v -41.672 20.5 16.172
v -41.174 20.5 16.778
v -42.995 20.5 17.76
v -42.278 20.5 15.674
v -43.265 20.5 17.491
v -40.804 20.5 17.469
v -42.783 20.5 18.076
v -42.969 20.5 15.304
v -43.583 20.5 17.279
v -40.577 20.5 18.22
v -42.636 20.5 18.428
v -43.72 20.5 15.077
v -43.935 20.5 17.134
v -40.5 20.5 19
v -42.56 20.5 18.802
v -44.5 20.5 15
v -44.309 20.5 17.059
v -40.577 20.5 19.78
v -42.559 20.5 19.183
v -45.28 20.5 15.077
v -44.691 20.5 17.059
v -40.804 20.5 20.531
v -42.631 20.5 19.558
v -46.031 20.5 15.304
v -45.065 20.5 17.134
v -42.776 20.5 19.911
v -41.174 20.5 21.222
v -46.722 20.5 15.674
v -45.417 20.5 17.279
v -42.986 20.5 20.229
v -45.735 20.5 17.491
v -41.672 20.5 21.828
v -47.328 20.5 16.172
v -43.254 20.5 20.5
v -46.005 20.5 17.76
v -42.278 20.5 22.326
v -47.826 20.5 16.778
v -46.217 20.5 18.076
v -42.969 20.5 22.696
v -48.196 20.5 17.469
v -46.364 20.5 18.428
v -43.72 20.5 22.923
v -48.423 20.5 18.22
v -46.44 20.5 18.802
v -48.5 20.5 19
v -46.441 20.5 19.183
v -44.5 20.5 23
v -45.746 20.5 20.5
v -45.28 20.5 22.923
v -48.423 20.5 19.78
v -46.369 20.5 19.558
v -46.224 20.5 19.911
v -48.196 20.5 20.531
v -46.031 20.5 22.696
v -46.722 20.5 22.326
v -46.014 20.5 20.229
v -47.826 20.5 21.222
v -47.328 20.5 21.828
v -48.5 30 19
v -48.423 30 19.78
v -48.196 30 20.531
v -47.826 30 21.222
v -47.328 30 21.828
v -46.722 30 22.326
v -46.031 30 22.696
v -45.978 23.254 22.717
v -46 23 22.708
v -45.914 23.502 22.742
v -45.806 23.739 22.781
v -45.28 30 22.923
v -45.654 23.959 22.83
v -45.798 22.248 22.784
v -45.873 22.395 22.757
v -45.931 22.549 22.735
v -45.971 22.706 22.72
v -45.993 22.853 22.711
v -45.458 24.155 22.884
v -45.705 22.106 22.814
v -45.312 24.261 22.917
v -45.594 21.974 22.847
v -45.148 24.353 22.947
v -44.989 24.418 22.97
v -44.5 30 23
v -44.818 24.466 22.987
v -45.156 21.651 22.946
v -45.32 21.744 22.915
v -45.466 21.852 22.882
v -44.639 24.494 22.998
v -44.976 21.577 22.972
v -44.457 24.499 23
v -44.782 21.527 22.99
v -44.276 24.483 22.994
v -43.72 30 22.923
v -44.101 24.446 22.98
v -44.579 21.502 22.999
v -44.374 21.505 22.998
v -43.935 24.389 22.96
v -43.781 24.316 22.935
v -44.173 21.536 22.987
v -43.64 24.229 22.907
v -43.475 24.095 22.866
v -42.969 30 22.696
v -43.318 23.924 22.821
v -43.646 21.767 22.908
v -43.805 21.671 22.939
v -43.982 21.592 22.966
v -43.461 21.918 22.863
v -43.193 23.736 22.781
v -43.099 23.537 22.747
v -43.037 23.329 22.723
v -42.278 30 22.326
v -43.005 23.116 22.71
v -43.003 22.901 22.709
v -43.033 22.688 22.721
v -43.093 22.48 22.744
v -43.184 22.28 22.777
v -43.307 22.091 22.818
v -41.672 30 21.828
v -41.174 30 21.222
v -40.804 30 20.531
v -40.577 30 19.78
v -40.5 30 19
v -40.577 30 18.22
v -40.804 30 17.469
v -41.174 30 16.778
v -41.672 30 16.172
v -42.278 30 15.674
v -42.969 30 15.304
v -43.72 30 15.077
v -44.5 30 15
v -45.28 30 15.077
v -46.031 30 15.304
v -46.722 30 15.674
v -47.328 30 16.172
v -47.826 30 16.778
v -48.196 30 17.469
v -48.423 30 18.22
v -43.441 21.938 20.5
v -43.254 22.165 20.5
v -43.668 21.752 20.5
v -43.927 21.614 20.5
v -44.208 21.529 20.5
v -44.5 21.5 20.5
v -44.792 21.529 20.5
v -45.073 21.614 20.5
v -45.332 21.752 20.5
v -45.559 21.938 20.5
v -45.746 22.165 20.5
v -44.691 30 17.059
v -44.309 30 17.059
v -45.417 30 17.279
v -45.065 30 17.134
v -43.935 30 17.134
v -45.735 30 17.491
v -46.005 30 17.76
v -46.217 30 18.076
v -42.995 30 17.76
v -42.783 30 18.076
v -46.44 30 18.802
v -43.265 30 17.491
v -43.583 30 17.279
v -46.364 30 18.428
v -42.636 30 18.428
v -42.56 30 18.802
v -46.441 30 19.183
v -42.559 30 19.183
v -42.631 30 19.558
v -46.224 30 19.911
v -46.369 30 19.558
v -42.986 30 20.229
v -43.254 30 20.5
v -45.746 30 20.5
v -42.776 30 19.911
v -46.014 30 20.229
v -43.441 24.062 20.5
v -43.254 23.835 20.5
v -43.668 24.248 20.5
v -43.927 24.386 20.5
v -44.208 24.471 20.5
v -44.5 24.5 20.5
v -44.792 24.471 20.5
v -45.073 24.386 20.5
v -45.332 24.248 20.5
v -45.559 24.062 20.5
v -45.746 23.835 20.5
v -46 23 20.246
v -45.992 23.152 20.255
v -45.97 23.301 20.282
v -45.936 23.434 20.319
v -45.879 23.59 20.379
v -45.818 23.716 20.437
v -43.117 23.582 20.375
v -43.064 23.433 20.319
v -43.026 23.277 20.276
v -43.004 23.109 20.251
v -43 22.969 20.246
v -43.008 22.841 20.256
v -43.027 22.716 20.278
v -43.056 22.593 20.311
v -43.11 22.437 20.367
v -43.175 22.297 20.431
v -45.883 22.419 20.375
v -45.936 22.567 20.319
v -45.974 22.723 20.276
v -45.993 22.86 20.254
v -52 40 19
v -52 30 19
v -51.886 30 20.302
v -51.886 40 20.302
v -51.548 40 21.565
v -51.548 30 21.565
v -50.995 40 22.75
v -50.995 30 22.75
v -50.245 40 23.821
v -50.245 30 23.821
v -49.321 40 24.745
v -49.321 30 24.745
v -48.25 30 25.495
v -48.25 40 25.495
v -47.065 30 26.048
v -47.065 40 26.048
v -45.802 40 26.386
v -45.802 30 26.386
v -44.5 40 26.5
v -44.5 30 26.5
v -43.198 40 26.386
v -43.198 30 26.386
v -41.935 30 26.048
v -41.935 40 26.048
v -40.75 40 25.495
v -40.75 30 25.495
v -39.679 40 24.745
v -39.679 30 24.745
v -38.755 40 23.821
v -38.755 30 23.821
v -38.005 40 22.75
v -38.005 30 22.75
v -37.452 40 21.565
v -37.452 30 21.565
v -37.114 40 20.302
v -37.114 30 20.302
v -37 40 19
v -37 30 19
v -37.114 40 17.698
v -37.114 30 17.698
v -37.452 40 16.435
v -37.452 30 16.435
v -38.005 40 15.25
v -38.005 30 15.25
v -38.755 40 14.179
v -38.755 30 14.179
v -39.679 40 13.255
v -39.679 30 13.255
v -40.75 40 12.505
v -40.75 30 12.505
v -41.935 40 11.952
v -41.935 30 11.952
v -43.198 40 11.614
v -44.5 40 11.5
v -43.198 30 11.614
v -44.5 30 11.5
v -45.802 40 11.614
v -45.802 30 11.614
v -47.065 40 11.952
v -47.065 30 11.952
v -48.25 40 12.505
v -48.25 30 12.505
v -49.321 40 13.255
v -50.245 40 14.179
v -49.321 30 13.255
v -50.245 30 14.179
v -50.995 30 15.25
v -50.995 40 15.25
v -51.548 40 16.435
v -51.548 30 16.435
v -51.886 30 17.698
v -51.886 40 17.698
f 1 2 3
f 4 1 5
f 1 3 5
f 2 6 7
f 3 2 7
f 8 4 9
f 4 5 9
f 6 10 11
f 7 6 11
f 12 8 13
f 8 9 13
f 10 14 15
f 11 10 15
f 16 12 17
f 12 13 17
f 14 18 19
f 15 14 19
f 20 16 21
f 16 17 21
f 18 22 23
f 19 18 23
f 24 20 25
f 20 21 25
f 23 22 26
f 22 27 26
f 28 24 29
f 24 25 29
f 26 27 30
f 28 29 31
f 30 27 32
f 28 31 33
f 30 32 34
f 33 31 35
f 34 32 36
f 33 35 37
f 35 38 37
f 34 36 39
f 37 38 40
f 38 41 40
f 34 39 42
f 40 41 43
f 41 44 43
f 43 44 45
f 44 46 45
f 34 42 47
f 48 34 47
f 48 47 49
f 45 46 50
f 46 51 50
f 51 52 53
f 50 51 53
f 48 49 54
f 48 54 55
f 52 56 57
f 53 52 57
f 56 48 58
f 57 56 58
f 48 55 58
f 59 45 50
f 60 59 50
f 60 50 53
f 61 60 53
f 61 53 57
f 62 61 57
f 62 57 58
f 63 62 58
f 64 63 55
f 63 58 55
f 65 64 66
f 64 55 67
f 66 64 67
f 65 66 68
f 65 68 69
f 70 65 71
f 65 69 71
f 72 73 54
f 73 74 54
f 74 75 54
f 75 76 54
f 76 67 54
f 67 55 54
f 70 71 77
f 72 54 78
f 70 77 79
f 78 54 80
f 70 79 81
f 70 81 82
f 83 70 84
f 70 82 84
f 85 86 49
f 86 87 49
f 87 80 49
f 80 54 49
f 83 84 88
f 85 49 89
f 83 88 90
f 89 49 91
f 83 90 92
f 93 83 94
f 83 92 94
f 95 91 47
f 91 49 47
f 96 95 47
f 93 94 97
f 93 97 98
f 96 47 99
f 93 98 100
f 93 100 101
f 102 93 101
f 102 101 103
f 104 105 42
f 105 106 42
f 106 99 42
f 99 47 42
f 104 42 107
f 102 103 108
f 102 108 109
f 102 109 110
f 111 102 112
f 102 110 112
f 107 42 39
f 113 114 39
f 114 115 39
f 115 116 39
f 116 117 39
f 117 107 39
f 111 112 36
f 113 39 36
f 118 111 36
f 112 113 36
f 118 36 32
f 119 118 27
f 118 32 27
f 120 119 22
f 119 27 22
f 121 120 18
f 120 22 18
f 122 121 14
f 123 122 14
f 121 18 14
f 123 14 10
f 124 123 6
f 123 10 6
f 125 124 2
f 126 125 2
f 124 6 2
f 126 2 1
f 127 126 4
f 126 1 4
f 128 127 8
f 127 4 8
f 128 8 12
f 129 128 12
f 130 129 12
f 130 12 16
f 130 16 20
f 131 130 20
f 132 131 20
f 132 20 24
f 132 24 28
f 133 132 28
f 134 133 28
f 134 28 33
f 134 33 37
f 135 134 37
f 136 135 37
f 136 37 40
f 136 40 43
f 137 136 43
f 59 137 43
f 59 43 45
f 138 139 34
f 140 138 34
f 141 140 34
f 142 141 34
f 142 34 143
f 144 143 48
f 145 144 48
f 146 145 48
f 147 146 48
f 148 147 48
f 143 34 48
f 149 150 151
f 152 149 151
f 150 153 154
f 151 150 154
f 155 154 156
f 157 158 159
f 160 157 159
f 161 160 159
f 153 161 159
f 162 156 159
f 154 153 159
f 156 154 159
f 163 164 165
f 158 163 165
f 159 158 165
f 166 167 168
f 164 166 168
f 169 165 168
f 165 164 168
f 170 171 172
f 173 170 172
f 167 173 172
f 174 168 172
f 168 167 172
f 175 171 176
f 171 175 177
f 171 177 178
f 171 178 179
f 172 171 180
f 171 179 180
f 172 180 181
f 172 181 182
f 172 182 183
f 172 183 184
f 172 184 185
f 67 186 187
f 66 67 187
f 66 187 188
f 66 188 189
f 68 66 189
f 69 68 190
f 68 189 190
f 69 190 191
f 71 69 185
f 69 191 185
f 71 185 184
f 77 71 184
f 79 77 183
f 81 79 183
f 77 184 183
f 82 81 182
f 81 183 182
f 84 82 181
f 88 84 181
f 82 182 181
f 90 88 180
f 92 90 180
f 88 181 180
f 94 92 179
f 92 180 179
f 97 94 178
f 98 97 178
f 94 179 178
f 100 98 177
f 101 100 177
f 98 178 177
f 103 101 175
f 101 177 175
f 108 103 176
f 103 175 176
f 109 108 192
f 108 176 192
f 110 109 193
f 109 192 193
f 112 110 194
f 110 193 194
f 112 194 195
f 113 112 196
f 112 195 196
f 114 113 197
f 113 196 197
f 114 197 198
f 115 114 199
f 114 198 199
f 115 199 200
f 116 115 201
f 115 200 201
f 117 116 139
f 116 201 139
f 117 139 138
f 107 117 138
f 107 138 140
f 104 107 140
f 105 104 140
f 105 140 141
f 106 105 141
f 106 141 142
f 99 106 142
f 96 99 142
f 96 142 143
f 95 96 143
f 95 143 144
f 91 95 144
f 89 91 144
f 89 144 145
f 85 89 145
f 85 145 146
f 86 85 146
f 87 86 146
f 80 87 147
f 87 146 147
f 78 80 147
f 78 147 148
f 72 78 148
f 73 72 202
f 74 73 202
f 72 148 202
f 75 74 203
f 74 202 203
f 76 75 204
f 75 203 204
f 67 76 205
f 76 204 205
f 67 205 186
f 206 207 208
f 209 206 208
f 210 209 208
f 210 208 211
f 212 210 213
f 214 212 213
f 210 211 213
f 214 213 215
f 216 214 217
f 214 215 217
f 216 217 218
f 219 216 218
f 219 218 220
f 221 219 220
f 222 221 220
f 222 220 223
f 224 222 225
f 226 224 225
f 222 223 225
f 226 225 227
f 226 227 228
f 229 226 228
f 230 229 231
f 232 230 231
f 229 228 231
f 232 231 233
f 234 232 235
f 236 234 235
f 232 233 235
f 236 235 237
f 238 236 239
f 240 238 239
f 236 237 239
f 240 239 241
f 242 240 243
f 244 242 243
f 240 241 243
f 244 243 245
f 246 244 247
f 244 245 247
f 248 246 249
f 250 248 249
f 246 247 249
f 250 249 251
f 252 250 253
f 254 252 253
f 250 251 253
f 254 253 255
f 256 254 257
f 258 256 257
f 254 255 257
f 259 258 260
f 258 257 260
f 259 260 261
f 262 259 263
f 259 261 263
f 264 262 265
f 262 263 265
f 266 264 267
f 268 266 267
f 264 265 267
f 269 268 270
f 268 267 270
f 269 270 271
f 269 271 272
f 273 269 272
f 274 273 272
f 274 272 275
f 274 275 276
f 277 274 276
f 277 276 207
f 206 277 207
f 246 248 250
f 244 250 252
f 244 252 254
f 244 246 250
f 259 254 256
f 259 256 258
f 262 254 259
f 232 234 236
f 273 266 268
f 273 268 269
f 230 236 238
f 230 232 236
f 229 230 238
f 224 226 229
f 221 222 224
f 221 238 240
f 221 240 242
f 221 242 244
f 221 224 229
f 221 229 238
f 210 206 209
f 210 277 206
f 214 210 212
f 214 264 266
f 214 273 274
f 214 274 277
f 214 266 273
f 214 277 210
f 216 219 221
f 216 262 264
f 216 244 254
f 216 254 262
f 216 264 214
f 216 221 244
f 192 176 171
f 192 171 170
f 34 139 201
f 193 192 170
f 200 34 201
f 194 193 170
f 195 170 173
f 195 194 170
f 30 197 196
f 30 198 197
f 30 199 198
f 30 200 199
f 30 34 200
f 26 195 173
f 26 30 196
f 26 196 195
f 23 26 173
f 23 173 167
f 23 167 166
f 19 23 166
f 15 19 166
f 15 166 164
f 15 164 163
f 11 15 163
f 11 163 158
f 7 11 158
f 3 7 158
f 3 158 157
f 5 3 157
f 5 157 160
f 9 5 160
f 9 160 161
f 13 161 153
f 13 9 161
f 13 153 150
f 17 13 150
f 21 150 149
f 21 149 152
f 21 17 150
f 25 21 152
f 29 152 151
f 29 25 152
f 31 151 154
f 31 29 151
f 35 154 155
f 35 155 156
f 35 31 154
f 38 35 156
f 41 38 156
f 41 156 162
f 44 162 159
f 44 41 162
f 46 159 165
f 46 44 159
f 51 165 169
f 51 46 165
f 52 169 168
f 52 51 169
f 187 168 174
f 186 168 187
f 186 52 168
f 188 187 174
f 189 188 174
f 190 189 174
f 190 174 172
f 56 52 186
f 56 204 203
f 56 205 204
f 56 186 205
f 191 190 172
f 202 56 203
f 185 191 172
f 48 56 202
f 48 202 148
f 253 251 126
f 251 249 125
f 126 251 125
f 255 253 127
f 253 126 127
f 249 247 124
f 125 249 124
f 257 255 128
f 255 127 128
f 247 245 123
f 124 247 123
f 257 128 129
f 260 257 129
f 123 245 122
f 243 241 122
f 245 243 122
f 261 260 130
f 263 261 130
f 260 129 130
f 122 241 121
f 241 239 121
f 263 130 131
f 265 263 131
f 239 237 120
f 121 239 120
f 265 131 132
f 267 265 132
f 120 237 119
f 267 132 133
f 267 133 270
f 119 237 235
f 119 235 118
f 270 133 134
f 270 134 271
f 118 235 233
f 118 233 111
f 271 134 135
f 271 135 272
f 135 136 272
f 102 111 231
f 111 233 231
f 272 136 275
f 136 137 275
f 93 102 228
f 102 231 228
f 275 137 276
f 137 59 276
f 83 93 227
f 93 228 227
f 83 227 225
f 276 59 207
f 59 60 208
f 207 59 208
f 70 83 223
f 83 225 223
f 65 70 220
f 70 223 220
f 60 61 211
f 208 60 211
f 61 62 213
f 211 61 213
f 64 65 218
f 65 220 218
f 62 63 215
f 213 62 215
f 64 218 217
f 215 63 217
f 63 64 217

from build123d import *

# Parameters (mm, degrees)
SKETCH268_R             = 4
PAD107_DEPTH            = 9.5
SKETCH269_R             = 7.5
PAD108_DEPTH            = 10
SKETCH270_R             = 1.5
POCKET131_DEPTH         = 7.501
BODY096_ROLL_ANGLE      = 90
BODY096_PLACEMENT_ANGLE = 180


with BuildPart() as part:
    # Sketch268 → Pad107 (new body)
    with BuildSketch(Plane.XY):
        Circle(SKETCH268_R)
        with BuildLine():
            Line((-1.245994, 1.5), (1.245994, 1.5))
            ThreePointArc((-1.245994, 1.5), (0, -1.95), (1.245994, 1.5))
        make_face(mode=Mode.SUBTRACT)
    extrude(amount=PAD107_DEPTH)

    # Sketch269 (on Face5 of Pad107) → Pad108 (join)
    with BuildSketch(Plane.XY.offset(9.5)):
        Circle(SKETCH269_R)
    extrude(amount=PAD108_DEPTH)

    # Sketch270 → Pocket131 (cut, through all)
    with BuildSketch(Plane.XZ):
        with Locations((0, 2.5)):
            Circle(SKETCH270_R)
    extrude(amount=-POCKET131_DEPTH, mode=Mode.SUBTRACT)


with BuildPart() as part_1:
    # Body096 roll: moved
    add(part.part.rotate(Axis((0, 0, 0), (1, 0, 0)), BODY096_ROLL_ANGLE))


with BuildPart() as part_2:
    # Body096 placement: moved
    add(part_1.part.moved(Location((-44.5, 20.5, 19))).rotate(Axis((-44.5, 20.5, 19), (0, 0, 1)), BODY096_PLACEMENT_ANGLE))


solid = part_2.part
